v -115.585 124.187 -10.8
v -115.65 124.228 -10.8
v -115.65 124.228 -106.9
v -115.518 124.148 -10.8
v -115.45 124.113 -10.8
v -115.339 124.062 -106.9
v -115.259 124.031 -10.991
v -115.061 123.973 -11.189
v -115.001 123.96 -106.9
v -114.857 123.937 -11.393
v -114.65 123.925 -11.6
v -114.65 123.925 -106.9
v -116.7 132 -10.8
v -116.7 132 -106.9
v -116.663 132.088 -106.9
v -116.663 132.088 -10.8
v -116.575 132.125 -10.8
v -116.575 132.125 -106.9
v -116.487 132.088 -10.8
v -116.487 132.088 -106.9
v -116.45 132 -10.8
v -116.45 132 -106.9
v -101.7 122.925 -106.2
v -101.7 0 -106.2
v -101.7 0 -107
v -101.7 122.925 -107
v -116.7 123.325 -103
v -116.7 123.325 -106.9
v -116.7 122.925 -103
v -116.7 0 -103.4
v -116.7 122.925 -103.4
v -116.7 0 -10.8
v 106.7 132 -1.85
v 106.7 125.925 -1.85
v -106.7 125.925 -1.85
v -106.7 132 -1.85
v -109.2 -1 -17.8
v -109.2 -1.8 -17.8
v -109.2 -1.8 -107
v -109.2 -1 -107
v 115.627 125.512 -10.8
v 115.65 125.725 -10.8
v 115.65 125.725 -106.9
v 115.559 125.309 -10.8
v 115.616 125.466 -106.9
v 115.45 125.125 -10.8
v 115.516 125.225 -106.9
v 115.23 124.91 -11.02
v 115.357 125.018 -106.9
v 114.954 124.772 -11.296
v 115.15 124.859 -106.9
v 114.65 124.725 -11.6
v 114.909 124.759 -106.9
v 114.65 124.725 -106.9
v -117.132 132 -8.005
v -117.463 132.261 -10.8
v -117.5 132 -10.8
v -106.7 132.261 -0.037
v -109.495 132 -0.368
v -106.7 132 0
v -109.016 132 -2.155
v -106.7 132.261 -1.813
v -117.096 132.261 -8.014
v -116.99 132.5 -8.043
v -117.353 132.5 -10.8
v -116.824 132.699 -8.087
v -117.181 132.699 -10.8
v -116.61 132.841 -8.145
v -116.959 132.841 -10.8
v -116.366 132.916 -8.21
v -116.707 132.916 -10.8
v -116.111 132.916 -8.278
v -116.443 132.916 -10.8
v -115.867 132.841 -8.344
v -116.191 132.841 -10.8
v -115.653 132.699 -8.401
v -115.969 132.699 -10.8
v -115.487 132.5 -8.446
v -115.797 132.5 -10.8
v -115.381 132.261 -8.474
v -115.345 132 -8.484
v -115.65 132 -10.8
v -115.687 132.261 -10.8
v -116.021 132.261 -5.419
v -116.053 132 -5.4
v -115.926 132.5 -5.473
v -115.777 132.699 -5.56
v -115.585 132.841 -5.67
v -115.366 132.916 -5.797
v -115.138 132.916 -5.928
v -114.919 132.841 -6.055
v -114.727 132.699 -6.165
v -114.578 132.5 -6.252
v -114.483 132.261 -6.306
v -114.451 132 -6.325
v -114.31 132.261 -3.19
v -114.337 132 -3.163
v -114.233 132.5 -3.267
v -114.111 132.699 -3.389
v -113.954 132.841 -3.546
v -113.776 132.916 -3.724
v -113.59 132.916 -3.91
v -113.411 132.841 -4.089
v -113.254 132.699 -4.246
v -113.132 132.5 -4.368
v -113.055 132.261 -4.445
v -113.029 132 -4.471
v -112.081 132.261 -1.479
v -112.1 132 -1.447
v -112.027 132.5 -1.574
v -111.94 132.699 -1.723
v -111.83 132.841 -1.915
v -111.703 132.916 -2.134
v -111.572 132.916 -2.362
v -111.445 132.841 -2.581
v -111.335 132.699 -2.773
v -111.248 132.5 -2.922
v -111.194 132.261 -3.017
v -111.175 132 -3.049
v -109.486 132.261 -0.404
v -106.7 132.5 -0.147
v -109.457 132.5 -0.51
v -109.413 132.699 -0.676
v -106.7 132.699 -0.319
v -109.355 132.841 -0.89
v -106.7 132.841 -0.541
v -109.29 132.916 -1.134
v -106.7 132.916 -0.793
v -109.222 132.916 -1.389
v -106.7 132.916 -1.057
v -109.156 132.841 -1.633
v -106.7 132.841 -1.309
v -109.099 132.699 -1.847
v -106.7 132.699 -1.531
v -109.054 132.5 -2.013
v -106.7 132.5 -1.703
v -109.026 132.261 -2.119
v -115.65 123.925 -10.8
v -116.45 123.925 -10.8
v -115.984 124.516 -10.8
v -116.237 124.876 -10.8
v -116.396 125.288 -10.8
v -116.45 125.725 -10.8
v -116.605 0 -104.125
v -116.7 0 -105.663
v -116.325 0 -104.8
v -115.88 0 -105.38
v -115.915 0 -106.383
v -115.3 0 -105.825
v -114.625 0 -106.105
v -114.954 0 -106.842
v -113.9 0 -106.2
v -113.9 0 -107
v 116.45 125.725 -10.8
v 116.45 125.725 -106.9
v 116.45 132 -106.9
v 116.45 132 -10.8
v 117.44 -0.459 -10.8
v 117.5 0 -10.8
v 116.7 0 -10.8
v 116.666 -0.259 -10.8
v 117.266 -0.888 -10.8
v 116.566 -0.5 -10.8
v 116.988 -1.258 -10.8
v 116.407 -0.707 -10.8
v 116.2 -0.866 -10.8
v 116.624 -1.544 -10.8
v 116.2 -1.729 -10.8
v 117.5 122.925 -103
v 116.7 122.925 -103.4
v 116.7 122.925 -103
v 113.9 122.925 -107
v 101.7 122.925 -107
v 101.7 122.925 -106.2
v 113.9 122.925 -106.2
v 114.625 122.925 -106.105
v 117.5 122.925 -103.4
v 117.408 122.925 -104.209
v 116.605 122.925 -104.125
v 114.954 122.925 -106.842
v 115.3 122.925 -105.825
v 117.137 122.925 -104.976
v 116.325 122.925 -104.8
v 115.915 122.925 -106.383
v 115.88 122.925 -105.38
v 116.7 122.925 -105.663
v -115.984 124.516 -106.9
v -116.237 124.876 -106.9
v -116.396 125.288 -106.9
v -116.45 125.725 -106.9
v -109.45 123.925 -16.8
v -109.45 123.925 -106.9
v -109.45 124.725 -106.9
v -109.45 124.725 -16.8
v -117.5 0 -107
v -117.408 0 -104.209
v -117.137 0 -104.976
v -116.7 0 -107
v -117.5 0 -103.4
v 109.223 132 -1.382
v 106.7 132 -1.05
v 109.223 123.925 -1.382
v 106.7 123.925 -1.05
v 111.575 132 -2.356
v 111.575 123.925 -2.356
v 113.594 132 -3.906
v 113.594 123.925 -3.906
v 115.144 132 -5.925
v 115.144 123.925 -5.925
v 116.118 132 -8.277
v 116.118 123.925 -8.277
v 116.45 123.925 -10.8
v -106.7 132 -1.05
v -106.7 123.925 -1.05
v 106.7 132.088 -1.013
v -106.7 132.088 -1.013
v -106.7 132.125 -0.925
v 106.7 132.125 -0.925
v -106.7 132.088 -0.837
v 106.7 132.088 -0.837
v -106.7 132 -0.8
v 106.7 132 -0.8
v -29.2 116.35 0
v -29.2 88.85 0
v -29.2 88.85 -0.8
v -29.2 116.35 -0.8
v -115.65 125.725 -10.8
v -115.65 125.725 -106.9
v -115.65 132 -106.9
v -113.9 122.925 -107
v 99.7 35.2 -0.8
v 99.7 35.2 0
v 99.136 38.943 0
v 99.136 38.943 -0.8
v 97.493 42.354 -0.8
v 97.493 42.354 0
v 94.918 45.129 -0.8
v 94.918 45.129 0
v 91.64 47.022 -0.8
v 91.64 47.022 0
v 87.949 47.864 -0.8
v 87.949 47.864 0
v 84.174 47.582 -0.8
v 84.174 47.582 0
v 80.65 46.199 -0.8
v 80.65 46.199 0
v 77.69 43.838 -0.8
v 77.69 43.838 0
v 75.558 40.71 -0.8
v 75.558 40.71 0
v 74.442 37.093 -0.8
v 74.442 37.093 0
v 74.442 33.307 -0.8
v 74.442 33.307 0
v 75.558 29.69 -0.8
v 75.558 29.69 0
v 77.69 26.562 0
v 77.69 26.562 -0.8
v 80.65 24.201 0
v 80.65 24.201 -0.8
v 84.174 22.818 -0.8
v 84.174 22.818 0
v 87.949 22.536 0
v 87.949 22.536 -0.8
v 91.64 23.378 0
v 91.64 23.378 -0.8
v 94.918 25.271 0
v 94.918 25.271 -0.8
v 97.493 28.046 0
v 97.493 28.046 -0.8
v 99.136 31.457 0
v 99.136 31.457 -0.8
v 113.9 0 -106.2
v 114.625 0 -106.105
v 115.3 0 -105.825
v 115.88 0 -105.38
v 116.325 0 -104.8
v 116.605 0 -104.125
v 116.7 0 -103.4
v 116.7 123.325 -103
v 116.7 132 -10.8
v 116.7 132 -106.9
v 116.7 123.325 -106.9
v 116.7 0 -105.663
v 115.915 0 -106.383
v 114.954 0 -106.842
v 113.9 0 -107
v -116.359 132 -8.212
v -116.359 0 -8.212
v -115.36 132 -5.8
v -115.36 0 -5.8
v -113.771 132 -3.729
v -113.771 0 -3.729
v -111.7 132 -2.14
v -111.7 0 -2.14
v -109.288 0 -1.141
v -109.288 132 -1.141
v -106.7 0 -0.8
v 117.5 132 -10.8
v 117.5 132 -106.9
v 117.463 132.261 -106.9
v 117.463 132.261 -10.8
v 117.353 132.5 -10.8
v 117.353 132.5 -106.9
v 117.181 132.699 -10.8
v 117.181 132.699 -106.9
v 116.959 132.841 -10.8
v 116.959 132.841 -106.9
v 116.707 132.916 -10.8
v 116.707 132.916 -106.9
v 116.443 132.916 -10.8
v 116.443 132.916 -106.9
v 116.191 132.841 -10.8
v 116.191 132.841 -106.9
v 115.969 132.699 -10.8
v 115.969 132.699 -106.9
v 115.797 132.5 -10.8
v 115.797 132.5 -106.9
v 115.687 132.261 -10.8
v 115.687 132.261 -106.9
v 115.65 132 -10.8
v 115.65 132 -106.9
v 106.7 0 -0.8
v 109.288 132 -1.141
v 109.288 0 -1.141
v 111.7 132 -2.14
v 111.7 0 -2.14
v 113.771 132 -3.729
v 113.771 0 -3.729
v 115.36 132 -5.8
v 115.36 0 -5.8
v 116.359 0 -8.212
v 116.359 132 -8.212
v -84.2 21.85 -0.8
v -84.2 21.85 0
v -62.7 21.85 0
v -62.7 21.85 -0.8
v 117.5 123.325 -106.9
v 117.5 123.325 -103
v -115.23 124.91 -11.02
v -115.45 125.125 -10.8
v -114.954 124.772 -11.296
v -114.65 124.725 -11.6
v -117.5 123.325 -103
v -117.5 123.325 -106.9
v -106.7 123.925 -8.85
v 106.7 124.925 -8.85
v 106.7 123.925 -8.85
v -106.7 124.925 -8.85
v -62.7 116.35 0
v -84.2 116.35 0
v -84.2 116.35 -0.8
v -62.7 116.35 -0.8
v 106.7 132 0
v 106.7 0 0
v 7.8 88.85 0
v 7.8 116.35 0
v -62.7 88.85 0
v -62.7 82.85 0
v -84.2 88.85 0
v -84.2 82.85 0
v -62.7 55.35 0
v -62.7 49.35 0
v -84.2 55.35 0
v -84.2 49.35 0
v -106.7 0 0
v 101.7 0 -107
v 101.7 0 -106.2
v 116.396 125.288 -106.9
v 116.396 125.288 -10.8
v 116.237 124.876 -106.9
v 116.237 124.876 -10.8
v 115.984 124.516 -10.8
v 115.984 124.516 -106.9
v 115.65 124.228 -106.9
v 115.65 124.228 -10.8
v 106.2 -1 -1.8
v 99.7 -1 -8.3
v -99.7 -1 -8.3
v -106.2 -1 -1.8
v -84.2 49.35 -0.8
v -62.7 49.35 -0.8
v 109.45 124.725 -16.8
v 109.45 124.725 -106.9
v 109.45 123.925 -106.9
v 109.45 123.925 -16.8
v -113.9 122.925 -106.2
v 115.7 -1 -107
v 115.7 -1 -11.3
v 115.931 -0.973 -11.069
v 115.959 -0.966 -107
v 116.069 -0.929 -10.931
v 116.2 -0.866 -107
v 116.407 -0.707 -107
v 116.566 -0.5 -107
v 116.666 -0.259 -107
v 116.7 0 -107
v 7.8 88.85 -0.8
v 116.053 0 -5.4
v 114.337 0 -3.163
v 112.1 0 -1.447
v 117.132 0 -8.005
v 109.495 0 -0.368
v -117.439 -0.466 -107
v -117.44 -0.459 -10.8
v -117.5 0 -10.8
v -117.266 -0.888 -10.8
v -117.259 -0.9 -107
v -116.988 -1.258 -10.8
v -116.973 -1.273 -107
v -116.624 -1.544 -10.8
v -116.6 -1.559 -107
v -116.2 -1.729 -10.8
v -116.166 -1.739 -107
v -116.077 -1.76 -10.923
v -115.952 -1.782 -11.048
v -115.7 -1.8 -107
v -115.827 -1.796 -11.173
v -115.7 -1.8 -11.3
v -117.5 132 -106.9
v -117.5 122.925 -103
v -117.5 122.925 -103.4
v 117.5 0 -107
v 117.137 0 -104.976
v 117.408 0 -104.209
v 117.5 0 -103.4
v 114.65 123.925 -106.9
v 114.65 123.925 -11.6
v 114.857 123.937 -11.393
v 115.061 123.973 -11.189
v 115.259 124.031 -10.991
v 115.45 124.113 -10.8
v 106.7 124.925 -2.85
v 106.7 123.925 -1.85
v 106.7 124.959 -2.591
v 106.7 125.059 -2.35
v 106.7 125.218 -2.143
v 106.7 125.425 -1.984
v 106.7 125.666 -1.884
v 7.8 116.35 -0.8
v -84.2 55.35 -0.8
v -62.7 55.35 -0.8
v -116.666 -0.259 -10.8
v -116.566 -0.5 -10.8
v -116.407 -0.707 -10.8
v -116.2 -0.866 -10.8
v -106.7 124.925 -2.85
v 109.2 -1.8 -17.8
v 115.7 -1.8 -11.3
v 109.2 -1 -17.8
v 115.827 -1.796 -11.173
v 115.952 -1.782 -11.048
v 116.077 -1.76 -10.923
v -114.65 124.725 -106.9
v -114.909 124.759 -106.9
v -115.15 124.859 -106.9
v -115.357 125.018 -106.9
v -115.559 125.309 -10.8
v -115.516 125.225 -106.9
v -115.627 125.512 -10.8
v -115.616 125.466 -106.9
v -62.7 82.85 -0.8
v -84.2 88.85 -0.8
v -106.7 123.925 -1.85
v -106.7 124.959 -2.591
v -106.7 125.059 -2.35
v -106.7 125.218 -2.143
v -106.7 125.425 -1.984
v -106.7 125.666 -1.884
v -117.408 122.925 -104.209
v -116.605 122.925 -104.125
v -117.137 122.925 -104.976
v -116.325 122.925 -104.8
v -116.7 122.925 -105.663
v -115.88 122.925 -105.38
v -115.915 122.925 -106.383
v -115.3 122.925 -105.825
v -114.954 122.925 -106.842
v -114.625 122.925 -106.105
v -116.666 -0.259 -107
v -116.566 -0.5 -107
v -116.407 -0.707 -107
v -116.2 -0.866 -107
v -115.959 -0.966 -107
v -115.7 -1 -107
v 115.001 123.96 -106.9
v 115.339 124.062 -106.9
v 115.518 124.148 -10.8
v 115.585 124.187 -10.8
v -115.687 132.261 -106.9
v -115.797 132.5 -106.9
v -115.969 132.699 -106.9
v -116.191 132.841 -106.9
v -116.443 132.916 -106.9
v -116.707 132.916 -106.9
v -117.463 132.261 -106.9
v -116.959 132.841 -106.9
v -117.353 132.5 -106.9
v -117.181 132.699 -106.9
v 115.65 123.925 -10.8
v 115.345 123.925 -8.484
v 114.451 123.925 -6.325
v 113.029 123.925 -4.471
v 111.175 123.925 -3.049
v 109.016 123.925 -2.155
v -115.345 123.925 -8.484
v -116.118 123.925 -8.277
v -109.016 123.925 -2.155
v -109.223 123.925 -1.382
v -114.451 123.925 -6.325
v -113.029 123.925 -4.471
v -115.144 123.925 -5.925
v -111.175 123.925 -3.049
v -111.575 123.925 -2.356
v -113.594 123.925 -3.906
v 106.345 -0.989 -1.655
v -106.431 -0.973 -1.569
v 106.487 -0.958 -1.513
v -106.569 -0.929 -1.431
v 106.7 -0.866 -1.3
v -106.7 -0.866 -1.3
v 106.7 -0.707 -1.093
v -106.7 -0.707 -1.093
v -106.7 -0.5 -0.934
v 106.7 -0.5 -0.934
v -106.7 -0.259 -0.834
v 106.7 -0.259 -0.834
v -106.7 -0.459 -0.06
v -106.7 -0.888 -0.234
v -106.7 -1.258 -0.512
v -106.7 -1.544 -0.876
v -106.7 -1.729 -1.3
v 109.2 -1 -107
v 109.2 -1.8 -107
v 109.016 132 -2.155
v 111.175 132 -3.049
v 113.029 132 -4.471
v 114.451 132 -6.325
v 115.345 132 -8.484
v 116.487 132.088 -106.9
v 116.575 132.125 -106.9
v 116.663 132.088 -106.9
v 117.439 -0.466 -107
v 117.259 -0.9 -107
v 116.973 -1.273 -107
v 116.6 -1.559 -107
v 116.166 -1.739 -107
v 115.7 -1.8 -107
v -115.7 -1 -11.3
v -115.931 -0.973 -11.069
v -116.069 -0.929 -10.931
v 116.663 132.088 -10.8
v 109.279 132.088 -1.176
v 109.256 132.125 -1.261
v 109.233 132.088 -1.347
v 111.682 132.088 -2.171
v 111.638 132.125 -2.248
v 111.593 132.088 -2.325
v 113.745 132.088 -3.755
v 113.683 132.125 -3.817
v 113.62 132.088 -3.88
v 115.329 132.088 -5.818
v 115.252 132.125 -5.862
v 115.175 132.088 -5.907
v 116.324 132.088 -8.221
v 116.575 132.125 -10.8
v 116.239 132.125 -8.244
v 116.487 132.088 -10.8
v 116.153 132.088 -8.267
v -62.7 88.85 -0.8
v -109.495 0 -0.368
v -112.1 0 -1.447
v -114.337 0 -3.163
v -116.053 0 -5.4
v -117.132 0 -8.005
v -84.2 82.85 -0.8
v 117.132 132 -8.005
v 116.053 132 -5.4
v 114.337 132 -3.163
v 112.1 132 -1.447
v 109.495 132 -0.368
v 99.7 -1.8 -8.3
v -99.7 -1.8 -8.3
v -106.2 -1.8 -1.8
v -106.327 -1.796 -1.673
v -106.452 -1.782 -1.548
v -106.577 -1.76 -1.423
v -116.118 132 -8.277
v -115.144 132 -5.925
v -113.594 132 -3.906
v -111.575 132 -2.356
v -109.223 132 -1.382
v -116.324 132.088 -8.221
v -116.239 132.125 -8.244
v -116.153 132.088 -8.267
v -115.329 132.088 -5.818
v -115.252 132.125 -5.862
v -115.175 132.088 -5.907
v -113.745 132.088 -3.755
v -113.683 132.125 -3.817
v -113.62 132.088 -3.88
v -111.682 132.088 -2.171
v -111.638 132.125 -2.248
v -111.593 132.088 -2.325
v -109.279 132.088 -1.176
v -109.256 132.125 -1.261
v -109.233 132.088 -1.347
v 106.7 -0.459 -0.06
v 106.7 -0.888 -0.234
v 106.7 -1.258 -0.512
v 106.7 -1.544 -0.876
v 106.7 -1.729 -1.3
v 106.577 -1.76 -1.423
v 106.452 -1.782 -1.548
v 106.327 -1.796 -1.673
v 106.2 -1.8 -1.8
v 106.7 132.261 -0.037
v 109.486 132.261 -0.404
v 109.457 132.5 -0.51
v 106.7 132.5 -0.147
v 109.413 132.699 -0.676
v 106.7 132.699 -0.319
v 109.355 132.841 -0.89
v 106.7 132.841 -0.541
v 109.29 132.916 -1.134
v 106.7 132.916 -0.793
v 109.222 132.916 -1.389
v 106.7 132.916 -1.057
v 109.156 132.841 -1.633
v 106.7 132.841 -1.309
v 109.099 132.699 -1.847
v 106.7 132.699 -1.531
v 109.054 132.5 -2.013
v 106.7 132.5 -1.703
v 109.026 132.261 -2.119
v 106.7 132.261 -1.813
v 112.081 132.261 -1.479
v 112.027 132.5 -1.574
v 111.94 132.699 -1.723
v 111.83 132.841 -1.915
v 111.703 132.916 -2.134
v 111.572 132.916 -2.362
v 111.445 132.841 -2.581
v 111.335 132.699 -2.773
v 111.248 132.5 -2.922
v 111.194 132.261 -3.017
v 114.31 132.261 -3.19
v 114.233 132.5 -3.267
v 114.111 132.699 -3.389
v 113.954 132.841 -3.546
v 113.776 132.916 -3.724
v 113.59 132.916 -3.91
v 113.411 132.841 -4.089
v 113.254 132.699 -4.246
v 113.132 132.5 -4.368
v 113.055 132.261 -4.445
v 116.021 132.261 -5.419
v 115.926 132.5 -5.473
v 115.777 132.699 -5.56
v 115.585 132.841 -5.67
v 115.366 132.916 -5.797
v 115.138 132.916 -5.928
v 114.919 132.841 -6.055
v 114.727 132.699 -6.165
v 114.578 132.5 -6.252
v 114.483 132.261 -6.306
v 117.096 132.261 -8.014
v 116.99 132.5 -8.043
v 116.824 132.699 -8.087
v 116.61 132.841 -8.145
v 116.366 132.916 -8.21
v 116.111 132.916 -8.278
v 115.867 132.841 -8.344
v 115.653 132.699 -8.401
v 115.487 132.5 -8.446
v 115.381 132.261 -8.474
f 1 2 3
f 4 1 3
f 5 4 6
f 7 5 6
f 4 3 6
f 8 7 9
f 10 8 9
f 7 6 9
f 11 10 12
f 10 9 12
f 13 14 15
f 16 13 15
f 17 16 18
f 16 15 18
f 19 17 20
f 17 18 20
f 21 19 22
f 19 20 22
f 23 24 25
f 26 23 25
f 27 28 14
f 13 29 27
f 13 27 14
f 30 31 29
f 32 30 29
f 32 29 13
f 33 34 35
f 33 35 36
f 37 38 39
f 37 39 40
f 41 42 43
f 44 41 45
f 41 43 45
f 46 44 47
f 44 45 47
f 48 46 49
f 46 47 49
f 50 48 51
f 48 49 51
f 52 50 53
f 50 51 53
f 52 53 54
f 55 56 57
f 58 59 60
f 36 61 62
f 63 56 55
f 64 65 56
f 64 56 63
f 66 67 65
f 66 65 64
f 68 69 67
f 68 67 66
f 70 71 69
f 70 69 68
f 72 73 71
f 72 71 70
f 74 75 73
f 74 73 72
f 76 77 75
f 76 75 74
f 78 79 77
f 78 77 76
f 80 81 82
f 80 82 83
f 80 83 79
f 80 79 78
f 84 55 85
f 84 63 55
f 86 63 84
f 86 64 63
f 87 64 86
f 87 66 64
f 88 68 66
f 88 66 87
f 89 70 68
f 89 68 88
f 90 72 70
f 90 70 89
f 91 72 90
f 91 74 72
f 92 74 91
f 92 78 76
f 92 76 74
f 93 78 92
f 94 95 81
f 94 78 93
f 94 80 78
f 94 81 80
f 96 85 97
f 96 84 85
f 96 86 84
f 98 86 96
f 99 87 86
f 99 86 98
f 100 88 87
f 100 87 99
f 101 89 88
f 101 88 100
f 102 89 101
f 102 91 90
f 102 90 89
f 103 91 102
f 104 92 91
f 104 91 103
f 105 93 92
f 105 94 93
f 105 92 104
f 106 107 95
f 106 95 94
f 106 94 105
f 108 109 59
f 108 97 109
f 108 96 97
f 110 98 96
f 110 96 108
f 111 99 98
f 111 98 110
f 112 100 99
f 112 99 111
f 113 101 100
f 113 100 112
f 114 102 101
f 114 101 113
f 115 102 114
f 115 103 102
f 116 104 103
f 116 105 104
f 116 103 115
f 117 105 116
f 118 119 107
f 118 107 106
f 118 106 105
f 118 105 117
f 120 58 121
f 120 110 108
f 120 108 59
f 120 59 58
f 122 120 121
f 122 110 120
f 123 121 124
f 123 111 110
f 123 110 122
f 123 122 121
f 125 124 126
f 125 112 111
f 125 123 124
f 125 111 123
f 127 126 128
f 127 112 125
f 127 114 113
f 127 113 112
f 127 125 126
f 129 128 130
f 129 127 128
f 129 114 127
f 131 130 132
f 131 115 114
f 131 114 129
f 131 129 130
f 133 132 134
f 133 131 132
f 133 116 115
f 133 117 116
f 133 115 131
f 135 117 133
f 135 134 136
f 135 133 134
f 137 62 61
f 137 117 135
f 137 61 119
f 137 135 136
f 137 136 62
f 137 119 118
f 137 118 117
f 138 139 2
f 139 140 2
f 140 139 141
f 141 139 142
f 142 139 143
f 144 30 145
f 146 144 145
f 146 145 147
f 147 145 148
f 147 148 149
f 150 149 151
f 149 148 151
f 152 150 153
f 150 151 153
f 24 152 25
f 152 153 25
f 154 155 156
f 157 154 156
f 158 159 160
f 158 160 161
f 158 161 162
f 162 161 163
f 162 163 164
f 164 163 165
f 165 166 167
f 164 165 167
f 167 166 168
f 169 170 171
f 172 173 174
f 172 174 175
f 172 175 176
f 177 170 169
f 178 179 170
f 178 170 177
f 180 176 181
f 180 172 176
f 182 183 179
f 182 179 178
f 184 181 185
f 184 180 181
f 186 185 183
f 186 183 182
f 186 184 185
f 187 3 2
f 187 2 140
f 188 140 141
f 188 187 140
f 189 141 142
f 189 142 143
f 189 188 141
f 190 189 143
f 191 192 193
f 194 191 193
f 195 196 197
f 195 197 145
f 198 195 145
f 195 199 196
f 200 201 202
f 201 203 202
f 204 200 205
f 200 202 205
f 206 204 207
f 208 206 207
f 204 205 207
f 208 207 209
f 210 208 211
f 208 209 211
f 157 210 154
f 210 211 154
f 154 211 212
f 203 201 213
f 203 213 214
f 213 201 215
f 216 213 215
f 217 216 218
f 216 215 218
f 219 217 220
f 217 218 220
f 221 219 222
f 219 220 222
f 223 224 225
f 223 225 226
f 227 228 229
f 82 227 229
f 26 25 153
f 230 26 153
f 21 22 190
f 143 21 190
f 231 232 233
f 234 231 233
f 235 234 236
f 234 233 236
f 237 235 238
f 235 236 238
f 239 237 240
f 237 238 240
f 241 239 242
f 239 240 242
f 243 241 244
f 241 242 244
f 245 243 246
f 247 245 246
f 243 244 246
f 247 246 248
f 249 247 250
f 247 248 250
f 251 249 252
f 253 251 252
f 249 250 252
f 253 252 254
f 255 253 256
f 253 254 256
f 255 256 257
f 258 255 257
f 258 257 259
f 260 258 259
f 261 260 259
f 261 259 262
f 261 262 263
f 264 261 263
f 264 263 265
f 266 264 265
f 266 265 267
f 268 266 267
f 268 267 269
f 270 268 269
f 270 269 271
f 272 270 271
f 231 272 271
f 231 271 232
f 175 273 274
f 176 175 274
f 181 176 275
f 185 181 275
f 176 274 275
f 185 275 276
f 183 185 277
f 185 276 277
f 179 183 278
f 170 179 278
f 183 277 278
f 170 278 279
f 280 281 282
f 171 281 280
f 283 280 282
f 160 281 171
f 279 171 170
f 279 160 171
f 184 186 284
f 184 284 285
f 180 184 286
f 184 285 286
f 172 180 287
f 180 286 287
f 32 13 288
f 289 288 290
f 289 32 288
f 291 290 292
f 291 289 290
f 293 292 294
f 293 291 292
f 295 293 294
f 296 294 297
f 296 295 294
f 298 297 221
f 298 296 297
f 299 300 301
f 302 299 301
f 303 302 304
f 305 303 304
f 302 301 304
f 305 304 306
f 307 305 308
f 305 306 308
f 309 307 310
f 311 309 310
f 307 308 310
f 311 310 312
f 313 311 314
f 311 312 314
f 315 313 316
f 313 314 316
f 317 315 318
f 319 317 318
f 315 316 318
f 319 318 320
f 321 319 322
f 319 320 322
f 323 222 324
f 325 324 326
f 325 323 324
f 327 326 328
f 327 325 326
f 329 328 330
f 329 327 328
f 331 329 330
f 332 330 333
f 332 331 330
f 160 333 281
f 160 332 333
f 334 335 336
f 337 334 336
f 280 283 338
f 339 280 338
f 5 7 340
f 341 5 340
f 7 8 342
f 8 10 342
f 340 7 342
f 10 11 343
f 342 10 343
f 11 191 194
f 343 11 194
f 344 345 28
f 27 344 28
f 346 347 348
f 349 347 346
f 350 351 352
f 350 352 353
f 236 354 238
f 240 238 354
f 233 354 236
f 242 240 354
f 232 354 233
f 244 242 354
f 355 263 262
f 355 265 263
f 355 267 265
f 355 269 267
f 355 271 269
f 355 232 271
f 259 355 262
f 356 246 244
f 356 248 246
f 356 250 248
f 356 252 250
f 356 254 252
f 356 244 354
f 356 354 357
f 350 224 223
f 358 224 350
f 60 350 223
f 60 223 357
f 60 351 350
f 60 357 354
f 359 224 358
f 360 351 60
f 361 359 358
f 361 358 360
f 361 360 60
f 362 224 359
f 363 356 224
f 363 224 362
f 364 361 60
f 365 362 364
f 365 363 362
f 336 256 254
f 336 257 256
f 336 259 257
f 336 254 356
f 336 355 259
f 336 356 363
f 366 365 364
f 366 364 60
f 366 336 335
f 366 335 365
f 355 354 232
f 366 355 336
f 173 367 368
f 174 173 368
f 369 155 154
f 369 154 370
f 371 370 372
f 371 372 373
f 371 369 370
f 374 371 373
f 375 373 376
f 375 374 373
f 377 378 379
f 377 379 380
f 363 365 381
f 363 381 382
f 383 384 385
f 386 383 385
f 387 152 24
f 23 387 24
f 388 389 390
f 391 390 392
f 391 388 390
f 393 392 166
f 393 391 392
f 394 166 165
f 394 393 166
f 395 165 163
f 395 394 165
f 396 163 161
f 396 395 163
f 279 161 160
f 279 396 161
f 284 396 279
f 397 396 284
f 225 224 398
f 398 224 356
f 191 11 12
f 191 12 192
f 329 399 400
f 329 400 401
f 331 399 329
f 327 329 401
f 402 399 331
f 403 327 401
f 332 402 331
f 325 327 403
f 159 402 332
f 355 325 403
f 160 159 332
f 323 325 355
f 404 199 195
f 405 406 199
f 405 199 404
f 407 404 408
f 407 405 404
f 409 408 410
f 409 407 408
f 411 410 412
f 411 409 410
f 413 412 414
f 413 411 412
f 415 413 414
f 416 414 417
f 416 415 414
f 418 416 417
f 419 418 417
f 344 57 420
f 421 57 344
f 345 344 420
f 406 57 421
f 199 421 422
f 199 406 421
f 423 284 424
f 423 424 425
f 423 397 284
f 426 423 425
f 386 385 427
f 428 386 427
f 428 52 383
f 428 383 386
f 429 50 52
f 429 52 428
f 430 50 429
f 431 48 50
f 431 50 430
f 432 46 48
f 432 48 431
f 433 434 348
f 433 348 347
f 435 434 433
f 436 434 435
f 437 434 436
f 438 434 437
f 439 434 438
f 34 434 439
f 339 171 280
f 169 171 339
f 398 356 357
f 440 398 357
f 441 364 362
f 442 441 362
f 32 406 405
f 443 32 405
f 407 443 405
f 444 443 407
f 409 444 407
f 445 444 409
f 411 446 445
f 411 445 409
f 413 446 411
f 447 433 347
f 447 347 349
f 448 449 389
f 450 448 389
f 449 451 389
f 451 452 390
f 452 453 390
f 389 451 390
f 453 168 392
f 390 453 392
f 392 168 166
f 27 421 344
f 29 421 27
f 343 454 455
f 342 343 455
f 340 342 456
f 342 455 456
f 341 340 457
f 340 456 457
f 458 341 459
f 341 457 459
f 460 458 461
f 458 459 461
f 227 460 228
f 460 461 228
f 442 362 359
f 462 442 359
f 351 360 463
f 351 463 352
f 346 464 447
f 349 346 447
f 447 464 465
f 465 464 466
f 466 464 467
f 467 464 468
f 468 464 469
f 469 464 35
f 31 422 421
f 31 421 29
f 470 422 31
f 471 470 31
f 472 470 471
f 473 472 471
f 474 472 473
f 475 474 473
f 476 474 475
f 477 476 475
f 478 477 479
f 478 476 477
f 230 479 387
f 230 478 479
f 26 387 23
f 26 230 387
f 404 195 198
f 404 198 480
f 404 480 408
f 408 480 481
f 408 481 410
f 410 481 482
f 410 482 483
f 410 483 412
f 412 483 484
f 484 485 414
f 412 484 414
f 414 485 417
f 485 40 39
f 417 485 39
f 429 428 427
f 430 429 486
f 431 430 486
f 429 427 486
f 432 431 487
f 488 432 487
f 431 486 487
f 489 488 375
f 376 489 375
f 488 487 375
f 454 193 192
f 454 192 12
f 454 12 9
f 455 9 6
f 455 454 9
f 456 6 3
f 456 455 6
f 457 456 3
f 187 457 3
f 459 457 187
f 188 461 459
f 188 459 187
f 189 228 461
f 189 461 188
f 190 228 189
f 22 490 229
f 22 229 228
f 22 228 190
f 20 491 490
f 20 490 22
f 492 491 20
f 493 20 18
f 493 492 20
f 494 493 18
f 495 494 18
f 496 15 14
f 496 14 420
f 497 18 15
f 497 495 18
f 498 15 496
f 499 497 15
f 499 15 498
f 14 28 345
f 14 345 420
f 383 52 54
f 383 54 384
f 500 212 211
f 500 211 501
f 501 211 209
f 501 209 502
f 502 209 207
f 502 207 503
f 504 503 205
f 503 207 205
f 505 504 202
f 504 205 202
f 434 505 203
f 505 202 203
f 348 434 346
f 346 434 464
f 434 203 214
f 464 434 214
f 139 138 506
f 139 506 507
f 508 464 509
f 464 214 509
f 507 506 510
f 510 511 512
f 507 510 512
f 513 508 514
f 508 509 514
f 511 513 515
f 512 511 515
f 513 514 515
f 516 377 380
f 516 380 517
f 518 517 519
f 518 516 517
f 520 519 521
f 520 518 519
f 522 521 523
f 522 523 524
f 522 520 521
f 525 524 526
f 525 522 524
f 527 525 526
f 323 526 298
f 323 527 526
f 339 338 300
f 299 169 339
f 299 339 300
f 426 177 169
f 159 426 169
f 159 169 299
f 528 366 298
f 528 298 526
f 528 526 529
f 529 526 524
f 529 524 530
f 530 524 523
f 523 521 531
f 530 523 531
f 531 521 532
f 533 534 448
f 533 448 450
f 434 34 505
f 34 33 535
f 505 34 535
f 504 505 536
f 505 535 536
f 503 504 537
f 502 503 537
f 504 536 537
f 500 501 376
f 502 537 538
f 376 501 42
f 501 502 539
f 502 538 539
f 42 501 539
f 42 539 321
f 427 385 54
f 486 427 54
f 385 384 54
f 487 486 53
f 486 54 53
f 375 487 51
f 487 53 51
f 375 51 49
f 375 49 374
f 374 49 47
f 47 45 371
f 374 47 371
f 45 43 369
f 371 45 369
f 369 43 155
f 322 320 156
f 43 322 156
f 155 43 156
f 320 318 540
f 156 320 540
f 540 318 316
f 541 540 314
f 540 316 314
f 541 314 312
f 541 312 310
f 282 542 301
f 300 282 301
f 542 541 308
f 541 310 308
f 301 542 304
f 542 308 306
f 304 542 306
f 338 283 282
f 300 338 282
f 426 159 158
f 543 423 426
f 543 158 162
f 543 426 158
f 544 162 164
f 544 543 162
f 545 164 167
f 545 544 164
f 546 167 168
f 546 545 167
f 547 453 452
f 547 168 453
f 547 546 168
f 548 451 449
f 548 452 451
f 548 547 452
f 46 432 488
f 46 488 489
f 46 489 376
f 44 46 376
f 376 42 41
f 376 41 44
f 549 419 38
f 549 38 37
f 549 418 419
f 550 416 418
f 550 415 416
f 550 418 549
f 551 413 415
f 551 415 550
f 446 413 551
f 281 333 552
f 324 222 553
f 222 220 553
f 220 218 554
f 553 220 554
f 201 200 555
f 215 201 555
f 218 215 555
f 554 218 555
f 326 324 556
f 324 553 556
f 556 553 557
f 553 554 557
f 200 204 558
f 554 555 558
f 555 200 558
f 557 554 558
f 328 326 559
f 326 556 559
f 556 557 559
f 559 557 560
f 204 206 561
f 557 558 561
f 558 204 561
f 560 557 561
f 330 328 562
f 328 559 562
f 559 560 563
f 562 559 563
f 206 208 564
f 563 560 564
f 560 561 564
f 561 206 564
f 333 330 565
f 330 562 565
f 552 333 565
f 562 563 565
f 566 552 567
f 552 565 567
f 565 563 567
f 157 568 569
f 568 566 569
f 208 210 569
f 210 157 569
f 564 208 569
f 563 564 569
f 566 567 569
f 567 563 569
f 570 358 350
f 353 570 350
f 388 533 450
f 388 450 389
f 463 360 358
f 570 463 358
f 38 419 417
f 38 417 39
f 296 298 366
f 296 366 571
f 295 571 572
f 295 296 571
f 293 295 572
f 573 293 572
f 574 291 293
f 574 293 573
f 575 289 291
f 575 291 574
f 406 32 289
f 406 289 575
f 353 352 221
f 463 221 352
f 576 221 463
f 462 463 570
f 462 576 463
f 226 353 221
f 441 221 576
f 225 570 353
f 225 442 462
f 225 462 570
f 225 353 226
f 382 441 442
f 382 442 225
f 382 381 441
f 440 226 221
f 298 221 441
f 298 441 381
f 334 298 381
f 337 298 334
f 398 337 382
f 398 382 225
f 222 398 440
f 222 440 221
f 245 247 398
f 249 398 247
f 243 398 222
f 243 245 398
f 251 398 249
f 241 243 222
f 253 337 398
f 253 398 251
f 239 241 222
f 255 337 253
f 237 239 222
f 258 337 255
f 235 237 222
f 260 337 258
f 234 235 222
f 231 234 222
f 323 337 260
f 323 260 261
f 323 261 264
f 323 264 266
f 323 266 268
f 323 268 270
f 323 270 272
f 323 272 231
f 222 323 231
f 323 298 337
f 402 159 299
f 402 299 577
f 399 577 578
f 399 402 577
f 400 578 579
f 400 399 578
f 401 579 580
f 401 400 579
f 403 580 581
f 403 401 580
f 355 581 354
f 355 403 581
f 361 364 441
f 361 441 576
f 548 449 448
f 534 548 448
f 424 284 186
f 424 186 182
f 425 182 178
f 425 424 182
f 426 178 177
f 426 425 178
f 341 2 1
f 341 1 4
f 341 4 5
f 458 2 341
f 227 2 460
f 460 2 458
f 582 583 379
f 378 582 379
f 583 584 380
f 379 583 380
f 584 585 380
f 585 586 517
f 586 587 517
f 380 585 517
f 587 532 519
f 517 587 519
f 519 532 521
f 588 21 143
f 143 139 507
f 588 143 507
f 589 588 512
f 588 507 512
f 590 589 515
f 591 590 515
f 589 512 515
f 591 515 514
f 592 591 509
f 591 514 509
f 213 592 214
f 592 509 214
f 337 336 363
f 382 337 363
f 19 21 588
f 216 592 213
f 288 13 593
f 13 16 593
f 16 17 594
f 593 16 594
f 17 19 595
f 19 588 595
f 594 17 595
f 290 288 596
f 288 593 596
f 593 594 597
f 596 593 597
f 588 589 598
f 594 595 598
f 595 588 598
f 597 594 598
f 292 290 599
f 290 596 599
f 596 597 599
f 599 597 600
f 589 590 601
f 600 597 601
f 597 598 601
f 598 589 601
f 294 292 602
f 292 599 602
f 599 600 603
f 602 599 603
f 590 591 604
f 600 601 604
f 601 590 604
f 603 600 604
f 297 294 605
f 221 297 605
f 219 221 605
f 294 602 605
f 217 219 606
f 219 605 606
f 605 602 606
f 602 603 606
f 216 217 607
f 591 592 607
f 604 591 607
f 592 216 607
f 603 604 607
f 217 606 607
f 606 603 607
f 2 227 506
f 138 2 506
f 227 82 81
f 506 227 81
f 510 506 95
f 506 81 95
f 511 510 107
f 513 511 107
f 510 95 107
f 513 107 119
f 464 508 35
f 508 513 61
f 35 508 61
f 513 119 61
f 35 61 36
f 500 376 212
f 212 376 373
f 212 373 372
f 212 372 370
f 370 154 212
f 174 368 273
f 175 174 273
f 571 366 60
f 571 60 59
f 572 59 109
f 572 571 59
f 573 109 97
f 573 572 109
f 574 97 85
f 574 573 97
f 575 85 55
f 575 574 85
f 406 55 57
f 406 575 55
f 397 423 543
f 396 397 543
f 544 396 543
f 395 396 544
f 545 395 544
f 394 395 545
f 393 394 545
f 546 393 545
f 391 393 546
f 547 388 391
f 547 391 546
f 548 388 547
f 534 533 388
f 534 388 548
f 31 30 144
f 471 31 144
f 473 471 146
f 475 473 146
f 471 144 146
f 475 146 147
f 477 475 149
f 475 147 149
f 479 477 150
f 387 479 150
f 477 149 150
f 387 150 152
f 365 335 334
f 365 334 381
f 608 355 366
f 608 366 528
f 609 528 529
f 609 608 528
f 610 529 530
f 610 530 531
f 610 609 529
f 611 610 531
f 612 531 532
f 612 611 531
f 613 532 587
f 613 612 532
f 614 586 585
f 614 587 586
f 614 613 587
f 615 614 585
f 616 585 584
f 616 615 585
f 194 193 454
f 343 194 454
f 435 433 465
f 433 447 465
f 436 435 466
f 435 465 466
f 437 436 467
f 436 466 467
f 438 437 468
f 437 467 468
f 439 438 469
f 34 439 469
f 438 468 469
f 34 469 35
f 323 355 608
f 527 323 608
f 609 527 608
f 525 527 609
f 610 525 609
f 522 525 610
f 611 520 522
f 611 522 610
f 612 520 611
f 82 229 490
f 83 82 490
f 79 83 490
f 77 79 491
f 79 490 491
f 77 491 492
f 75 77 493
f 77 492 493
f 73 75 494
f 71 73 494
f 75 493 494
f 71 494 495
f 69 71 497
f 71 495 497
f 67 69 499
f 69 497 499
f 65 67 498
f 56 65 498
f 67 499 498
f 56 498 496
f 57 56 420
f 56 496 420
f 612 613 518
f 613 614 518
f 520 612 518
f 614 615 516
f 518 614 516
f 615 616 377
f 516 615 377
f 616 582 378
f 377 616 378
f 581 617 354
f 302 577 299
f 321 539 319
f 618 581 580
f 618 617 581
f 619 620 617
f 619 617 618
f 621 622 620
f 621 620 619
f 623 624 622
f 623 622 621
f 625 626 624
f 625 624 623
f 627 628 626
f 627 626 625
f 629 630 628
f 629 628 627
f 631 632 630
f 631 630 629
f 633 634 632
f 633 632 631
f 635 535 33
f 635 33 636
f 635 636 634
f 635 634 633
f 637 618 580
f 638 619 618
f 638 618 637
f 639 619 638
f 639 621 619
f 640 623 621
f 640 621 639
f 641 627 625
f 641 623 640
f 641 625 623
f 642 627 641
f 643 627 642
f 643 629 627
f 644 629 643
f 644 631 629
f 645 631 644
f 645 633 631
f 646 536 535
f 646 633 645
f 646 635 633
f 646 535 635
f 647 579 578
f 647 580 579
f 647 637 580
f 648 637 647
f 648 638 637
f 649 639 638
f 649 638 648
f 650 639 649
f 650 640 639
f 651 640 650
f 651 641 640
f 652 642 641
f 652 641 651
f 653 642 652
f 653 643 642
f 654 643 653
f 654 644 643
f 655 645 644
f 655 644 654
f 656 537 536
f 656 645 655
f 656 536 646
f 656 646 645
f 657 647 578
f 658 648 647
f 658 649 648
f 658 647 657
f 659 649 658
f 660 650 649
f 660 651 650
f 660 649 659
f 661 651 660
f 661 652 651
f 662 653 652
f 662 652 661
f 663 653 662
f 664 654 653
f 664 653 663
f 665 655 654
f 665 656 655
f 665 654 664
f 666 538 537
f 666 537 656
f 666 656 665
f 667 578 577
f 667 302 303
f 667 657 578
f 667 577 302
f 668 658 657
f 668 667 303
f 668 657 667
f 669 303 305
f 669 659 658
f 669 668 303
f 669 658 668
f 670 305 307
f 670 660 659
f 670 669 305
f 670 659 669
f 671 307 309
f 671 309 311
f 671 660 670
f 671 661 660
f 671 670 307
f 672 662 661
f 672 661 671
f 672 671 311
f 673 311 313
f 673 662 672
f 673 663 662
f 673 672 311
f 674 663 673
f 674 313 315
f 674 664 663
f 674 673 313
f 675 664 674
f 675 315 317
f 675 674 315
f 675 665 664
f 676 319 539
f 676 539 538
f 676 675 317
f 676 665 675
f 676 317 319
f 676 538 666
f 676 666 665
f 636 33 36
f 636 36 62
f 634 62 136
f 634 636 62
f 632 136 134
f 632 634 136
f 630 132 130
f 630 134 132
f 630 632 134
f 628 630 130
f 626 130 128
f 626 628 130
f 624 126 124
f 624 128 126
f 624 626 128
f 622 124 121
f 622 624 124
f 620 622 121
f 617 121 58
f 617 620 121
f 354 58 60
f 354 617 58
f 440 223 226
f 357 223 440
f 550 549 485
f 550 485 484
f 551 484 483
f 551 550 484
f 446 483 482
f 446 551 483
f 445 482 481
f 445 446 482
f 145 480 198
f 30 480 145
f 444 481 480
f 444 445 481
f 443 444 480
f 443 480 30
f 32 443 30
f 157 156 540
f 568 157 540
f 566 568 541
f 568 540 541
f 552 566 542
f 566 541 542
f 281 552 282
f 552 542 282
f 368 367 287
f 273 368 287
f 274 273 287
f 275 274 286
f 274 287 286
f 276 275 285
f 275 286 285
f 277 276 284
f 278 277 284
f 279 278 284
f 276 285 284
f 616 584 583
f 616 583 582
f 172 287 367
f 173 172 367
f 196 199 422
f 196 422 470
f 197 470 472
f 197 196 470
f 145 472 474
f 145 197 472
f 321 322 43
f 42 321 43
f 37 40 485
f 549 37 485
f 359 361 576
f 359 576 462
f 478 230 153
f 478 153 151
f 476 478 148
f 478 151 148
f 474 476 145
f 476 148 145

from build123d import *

# Parameters (mm, degrees)
BASE_FLANGE1_DEPTH        = 132
HEM2_START                = -107
HEM2_DEPTH                = 96.2
SKETCH31_R                = 12.7
CUT_EXTRUDE1_DEPTH        = 208.181817916
EDGE_FLANGE1_DEPTH        = 96.2
EDGE_FLANGE1_BEND_DEPTH   = 213.4
EDGE_FLANGE1_BEND_2_DEPTH = 96.2
CHAMFER1_SIZE             = 7
SKETCH41_W                = 21.5
SKETCH41_H                = 27.5
CUT_EXTRUDE2_DEPTH        = 208.181817916
LPATTERN1_COUNT           = 3
LPATTERN1_PITCH           = 33.5
SKETCH44_W                = 235
SKETCH44_H                = 10
CUT_EXTRUDE3_DEPTH        = 0.1
EDGE_FLANGE2_DEPTH        = 123.325
EDGE_FLANGE2_START        = 122.925
EDGE_FLANGE2_2_DEPTH      = 0.4
EDGE_FLANGE2_3_DEPTH      = 122.925
EDGE_FLANGE4_START        = -106.9
EDGE_FLANGE4_DEPTH        = 96.1
EDGE_FLANGE4_2_DEPTH      = 96.1
CHAMFER2_SIZE             = 6
SKETCH80_W                = 213.4
SKETCH80_H                = 1
BOSS_EXTRUDE1_DEPTH       = 7
FILLET1_R                 = 1
SKETCH92_W                = 37
SKETCH92_H                = 27.5
CUT_EXTRUDE4_DEPTH        = 208.181817916


# Read off the part's stored shape, not the designer's step: Hem2, Edge-Flange2, Edge-Flange4
# Sheet-metal steps are written as plain solids
with BuildPart() as part:
    # Sketch1 → Base-Flange1 (new body)
    with BuildSketch(Plane(origin=(0, 0, 0), x_dir=(1, 0, 0), z_dir=(0, 1, 0))):
        with BuildLine():
            Line((117.5, 107), (117.5, 10.8))
            ThreePointArc((117.5, 10.8), (114.336753237, 3.163246763), (106.7, 0))
            Line((106.7, 0), (0, 0))
            Line((0, 0), (-106.7, 0))
            ThreePointArc((-106.7, 0), (-114.336753237, 3.163246763), (-117.5, 10.8))
            Line((-117.5, 10.8), (-117.5, 107))
            Line((-117.5, 107), (-116.7, 107))
            Line((-116.7, 107), (-116.7, 10.8))
            ThreePointArc((-116.7, 10.8), (-113.771067812, 3.728932188), (-106.7, 0.8))
            Line((-106.7, 0.8), (0, 0.8))
            Line((0, 0.8), (106.7, 0.8))
            ThreePointArc((106.7, 0.8), (113.771067812, 3.728932188), (116.7, 10.8))
            Line((116.7, 10.8), (116.7, 107))
            Line((116.7, 107), (117.5, 107))
        make_face()
    extrude(amount=BASE_FLANGE1_DEPTH)

    # Hem2 outline → Hem2 (add)
    with BuildSketch(Plane.XY.offset(HEM2_START)):
        with BuildLine():
            Line((-116.45, 123.925), (-115.65, 123.925))
            Line((-115.65, 123.925), (-115.65, 132))
            ThreePointArc((-115.65, 132), (-116.575, 132.925), (-117.5, 132))
            Line((-117.5, 132), (-116.7, 132))
            ThreePointArc((-116.7, 132), (-116.575, 132.125), (-116.45, 132))
            Line((-116.45, 132), (-116.45, 123.925))
        make_face()
        with BuildLine():
            Line((115.65, 123.925), (116.45, 123.925))
            Line((116.45, 123.925), (116.45, 132))
            ThreePointArc((116.45, 132), (116.575, 132.125), (116.7, 132))
            Line((116.7, 132), (117.5, 132))
            ThreePointArc((117.5, 132), (116.575, 132.925), (115.65, 132))
            Line((115.65, 132), (115.65, 123.925))
        make_face()
    extrude(amount=HEM2_DEPTH)

    # Sweep1: sweep along a path in Sketch30
    with BuildLine(Plane(origin=(0, 132, 0), x_dir=(1, 0, 0), z_dir=(0, 1, 0))) as sweep1_path:
        ThreePointArc((-116.7, 10.8), (-113.771067812, 3.728932188), (-106.7, 0.8))
        Line((-106.7, 0.8), (106.7, 0.8))
        ThreePointArc((106.7, 0.8), (113.771067812, 3.728932188), (116.7, 10.8))
    # Sketch29 → Sweep1 (sweep)
    with BuildSketch(Plane.XY.offset(-10.8)):
        with BuildLine():
            Line((-117.5, 132), (-116.7, 132))
            ThreePointArc((-116.7, 132), (-116.575, 132.125), (-116.45, 132))
            Line((-116.45, 132), (-116.45, 123.925))
            Line((-116.45, 123.925), (-115.65, 123.925))
            Line((-115.65, 123.925), (-115.65, 132))
            ThreePointArc((-115.65, 132), (-116.575, 132.925), (-117.5, 132))
        make_face()
    sweep(path=sweep1_path.line)

    # Sketch31 → Cut-Extrude1 (cut, through all)
    with BuildSketch(Plane.XY):
        with Locations((87, 35.2)):
            Circle(SKETCH31_R)
    extrude(amount=-CUT_EXTRUDE1_DEPTH, mode=Mode.SUBTRACT)

    # Edge-Flange1 section (across the edge) → Edge-Flange1 (add)
    with BuildSketch(Plane(origin=(-116.7, -1, -10.8), x_dir=(0, 1, 0), z_dir=(0, 0, -1))):
        with BuildLine():
            Line((-0.8, 1), (-0.8, 7.5))
            Line((-0.8, 7.5), (0, 7.5))
            Line((0, 7.5), (0, 1))
            ThreePointArc((0, 1), (0.292893219, 0.292893219), (1, 0))
            Line((1, 0), (1, -0.8))
            ThreePointArc((1, -0.8), (-0.272792206, -0.272792206), (-0.8, 1))
        make_face()
    extrude(amount=EDGE_FLANGE1_DEPTH)

    # Edge-Flange1 section 2 (across the edge) → Edge-Flange1 bend (add)
    with BuildSketch(Plane(origin=(106.7, -1, -0.8), x_dir=(0, 1, 0), z_dir=(-1, 0, 0))):
        with BuildLine():
            Line((-0.8, 1), (-0.8, 7.5))
            Line((-0.8, 7.5), (0, 7.5))
            Line((0, 7.5), (0, 1))
            ThreePointArc((0, 1), (0.292893219, 0.292893219), (1, 0))
            Line((1, 0), (1, -0.8))
            ThreePointArc((1, -0.8), (-0.272792206, -0.272792206), (-0.8, 1))
        make_face()
    extrude(amount=EDGE_FLANGE1_BEND_DEPTH)

    # Edge-Flange1 section 3 (across the edge) → Edge-Flange1 bend 2 (add)
    with BuildSketch(Plane(origin=(116.7, -1, -107), x_dir=(0, 1, 0), z_dir=(0, 0, 1))):
        with BuildLine():
            Line((-0.8, 1), (-0.8, 7.5))
            Line((-0.8, 7.5), (0, 7.5))
            Line((0, 7.5), (0, 1))
            ThreePointArc((0, 1), (0.292893219, 0.292893219), (1, 0))
            Line((1, 0), (1, -0.8))
            ThreePointArc((1, -0.8), (-0.272792206, -0.272792206), (-0.8, 1))
        make_face()
    extrude(amount=EDGE_FLANGE1_BEND_2_DEPTH)

    # Chamfer1
    chamfer1_edges = [part.edges().sort_by_distance(p)[0] for p in [
        (106.7, -1.4, -8.3),
        (109.2, -1.4, -10.8),
        (-106.7, -1.4, -8.3),
        (-109.2, -1.4, -10.8),
    ]]
    chamfer(chamfer1_edges, length=CHAMFER1_SIZE)

    # Sketch41 → Cut-Extrude2 (cut, through all)
    with BuildSketch(Plane.XY):
        with Locations((-73.45, 102.6)):
            Rectangle(SKETCH41_W, SKETCH41_H)
    cut_extrude2 = extrude(amount=-CUT_EXTRUDE2_DEPTH, mode=Mode.SUBTRACT)

    # LPattern1: Cut-Extrude2 ×3
    with Locations(*[(0, -i * LPATTERN1_PITCH, 0) for i in range(1, LPATTERN1_COUNT)]):
        add(cut_extrude2, mode=Mode.SUBTRACT)

    # Sketch44 → Cut-Extrude3 (cut)
    with BuildSketch(Plane(origin=(0, 0, -107), x_dir=(-1, 0, 0), z_dir=(0, 0, -1))):
        with Locations((0, 127.925)):
            Rectangle(SKETCH44_W, SKETCH44_H)
    extrude(amount=-CUT_EXTRUDE3_DEPTH, mode=Mode.SUBTRACT)

    # Edge-Flange2 outline → Edge-Flange2 (cut)
    with BuildSketch(Plane(origin=(0, 0, 0), x_dir=(1, 0, 0), z_dir=(0, 1, 0))):
        with BuildLine():
            ThreePointArc((116.7, 105.662741699), (117.29411255, 104.6), (117.5, 103.4))
            Line((117.5, 103.4), (117.5, 107))
            Line((117.5, 107), (116.7, 107))
            Line((116.7, 107), (116.7, 105.662741699))
        make_face()
        with BuildLine():
            ThreePointArc((-117.5, 103.4), (-117.29411255, 104.6), (-116.7, 105.662741699))
            Line((-116.7, 105.662741699), (-116.7, 107))
            Line((-116.7, 107), (-117.5, 107))
            Line((-117.5, 107), (-117.5, 103.4))
        make_face()
    extrude(amount=EDGE_FLANGE2_DEPTH, mode=Mode.SUBTRACT)

    # Edge-Flange2 2 outline → Edge-Flange2 2 (cut)
    with BuildSketch(Plane(origin=(0, 0, 0), x_dir=(1, 0, 0), z_dir=(0, 1, 0)).offset(EDGE_FLANGE2_START)):
        with BuildLine():
            ThreePointArc((117.5, 103.4), (117.29411255, 104.6), (116.7, 105.662741699))
            Line((116.7, 105.662741699), (116.7, 103))
            Line((116.7, 103), (117.5, 103))
            Line((117.5, 103), (117.5, 103.4))
        make_face()
        with BuildLine():
            Line((-116.7, 103), (-116.7, 105.662741699))
            ThreePointArc((-116.7, 105.662741699), (-117.29411255, 104.6), (-117.5, 103.4))
            Line((-117.5, 103.4), (-117.5, 103))
            Line((-117.5, 103), (-116.7, 103))
        make_face()
    extrude(amount=EDGE_FLANGE2_2_DEPTH, mode=Mode.SUBTRACT)

    # Edge-Flange2 3 outline → Edge-Flange2 3 (add)
    with BuildSketch(Plane(origin=(0, 0, 0), x_dir=(1, 0, 0), z_dir=(0, 1, 0))):
        with BuildLine():
            Line((113.9, 107), (101.7, 107))
            Line((101.7, 107), (101.7, 106.2))
            Line((101.7, 106.2), (113.9, 106.2))
            ThreePointArc((113.9, 106.2), (115.879898987, 105.379898987), (116.7, 103.4))
            Line((116.7, 103.4), (116.7, 105.662741699))
            ThreePointArc((116.7, 105.662741699), (115.451471863, 106.648528137), (113.9, 107))
        make_face()
        with BuildLine():
            Line((-101.7, 107), (-113.9, 107))
            ThreePointArc((-113.9, 107), (-115.451471863, 106.648528137), (-116.7, 105.662741699))
            Line((-116.7, 105.662741699), (-116.7, 103.4))
            ThreePointArc((-116.7, 103.4), (-115.879898987, 105.379898987), (-113.9, 106.2))
            Line((-113.9, 106.2), (-101.7, 106.2))
            Line((-101.7, 106.2), (-101.7, 107))
        make_face()
    extrude(amount=EDGE_FLANGE2_3_DEPTH)

    # Edge-Flange4 outline → Edge-Flange4 (cut)
    with BuildSketch(Plane.XY.offset(EDGE_FLANGE4_START)):
        with BuildLine():
            ThreePointArc((116.45, 125.725), (116.237450787, 124.876471863), (115.65, 124.228337046))
            Line((115.65, 124.228337046), (115.65, 123.925))
            Line((115.65, 123.925), (116.45, 123.925))
            Line((116.45, 123.925), (116.45, 125.725))
        make_face()
        with BuildLine():
            Line((-115.65, 123.925), (-115.65, 124.228337046))
            ThreePointArc((-115.65, 124.228337046), (-116.237450787, 124.876471863), (-116.45, 125.725))
            Line((-116.45, 125.725), (-116.45, 123.925))
            Line((-116.45, 123.925), (-115.65, 123.925))
        make_face()
    extrude(amount=EDGE_FLANGE4_DEPTH, mode=Mode.SUBTRACT)

    # Edge-Flange4 2 outline → Edge-Flange4 2 (add)
    with BuildSketch(Plane.XY.offset(EDGE_FLANGE4_START)):
        with BuildLine():
            Line((109.45, 123.925), (114.65, 123.925))
            ThreePointArc((114.65, 123.925), (115.172497216, 124.002502784), (115.65, 124.228337046))
            Line((115.65, 124.228337046), (115.65, 125.725))
            ThreePointArc((115.65, 125.725), (115.357106781, 125.017893219), (114.65, 124.725))
            Line((114.65, 124.725), (109.45, 124.725))
            Line((109.45, 124.725), (109.45, 123.925))
        make_face()
        with BuildLine():
            Line((-114.65, 123.925), (-109.45, 123.925))
            Line((-109.45, 123.925), (-109.45, 124.725))
            Line((-109.45, 124.725), (-114.65, 124.725))
            ThreePointArc((-114.65, 124.725), (-115.357106781, 125.017893219), (-115.65, 125.725))
            Line((-115.65, 125.725), (-115.65, 124.228337046))
            ThreePointArc((-115.65, 124.228337046), (-115.172497216, 124.002502784), (-114.65, 123.925))
        make_face()
    extrude(amount=EDGE_FLANGE4_2_DEPTH)

    # Chamfer2
    chamfer2_edges = [part.edges().sort_by_distance(p)[0] for p in [
        (-109.45, 124.325, -10.8),
        (109.45, 124.325, -10.8),
    ]]
    chamfer(chamfer2_edges, length=CHAMFER2_SIZE)

    # Sketch80 → Boss-Extrude1 (add)
    with BuildSketch(Plane(origin=(0, 0, -1.85), x_dir=(-1, 0, 0), z_dir=(0, 0, -1))):
        with Locations((0, 124.425)):
            Rectangle(SKETCH80_W, SKETCH80_H)
    extrude(amount=BOSS_EXTRUDE1_DEPTH)

    # Fillet1
    fillet1_edges = [part.edges().sort_by_distance(p)[0] for p in [
        (0, 124.925, -1.85),
    ]]
    fillet(fillet1_edges, radius=FILLET1_R)

    # Sketch92 → Cut-Extrude4 (cut, through all)
    with BuildSketch(Plane.XY):
        with Locations((-10.7, 102.6)):
            Rectangle(SKETCH92_W, SKETCH92_H)
    extrude(amount=-CUT_EXTRUDE4_DEPTH, mode=Mode.SUBTRACT)


solid = part.part
